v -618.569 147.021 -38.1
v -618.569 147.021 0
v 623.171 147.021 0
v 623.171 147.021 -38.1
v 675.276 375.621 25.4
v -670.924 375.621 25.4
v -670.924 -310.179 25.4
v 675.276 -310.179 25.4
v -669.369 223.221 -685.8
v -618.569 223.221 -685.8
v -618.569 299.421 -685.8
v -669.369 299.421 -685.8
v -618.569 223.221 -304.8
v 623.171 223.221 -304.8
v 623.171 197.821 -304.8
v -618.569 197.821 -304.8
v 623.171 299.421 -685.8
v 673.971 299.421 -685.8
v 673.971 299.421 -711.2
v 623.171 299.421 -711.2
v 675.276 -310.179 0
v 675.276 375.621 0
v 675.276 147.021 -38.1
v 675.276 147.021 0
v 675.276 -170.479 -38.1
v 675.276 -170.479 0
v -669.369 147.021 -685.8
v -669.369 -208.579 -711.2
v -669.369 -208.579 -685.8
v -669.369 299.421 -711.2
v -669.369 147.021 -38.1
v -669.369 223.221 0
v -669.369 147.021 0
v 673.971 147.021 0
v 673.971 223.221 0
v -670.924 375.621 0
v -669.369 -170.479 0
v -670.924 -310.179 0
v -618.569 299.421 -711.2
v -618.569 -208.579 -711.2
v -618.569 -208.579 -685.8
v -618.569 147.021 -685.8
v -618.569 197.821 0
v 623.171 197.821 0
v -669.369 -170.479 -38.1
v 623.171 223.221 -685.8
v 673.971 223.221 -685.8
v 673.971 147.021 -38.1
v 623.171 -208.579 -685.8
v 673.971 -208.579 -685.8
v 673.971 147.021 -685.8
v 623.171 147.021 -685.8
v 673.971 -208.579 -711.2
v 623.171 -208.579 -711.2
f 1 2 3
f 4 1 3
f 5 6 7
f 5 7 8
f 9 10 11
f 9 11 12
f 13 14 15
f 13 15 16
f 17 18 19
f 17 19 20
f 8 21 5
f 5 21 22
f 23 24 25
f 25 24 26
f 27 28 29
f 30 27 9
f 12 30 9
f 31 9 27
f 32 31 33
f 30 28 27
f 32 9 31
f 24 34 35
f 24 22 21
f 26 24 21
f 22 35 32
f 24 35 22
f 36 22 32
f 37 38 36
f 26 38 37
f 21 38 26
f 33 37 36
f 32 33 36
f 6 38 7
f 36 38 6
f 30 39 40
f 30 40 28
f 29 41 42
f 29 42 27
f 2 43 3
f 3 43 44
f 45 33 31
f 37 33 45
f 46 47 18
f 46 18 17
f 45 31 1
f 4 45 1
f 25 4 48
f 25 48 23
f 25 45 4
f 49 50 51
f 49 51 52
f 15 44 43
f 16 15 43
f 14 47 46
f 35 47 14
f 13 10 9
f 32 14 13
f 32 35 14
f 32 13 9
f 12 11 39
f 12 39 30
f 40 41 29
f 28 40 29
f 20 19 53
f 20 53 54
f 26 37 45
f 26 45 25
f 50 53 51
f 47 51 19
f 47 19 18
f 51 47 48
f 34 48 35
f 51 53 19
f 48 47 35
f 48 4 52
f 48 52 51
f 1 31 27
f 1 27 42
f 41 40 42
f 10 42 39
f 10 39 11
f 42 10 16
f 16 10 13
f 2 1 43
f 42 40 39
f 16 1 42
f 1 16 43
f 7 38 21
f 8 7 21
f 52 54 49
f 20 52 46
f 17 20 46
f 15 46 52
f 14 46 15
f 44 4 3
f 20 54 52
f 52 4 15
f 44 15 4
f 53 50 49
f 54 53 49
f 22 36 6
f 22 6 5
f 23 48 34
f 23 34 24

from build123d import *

# Parameters (mm, degrees)
F0_W          = 1346.2
F0_H          = 685.8
F1_DEPTH      = 25.4
F2_W          = 50.8
F2_H          = 76.2
F3_DEPTH      = 685.8
F4_W          = 1344.644603
F4_H          = 317.5
F5_DEPTH      = 38.1
F6_W          = 50.8
F6_H          = 25.4
F8_DEPTH      = 76.2
F8_DEPTH_BACK = 431.8
F7_W          = 50.8
F7_H          = 25.4
F9_DEPTH      = 76.2
F9_DEPTH_BACK = 431.8
F10_W         = 1244.6
F10_H         = 304.8
F11_DEPTH     = 25.4


with BuildPart() as f1:
    # F0 (on Top) → F1 (new body)
    with BuildSketch(Plane.XY):
        with Locations((2.175501, 32.721092)):
            Rectangle(F0_W, F0_H)
    extrude(amount=F1_DEPTH)



with BuildPart() as f3:
    # F2 (on Top) → F3 (new body)
    with BuildSketch(Plane.XY):
        with Locations((-643.969102, 185.121092)):
            Rectangle(F2_W, F2_H)
        with Locations((648.571236, 185.121092)):
            Rectangle(F2_W, F2_H)
    extrude(amount=-F3_DEPTH)


with BuildPart() as f1_1:
    add(f1.part)

    add(f3.part)  # F5 merges F3
    # F4 (on face) → F5 (join)
    with BuildSketch(Plane(origin=(0, 0, 0), x_dir=(1, 0, 0), z_dir=(0, 0, -1))):
        with Locations((2.953199, 11.728908)):
            Rectangle(F4_W, F4_H)
    extrude(amount=F5_DEPTH)

    # F6 (on face) → F8 (join, two sides)
    with BuildSketch(Plane(origin=(0, 223.221092, 0), x_dir=(-1, 0, 0), z_dir=(0, 1, 0))) as f8_sk:
        with Locations((-648.571236, -698.5)):
            Rectangle(F6_W, F6_H)
    extrude(amount=F8_DEPTH)
    extrude(f8_sk.sketch, amount=-F8_DEPTH_BACK)

    # F7 (on face) → F9 (join, two sides)
    with BuildSketch(Plane(origin=(0, 223.221092, 0), x_dir=(-1, 0, 0), z_dir=(0, 1, 0))) as f9_sk:
        with Locations((643.969102, -698.5)):
            Rectangle(F7_W, F7_H)
    extrude(amount=F9_DEPTH)
    extrude(f9_sk.sketch, amount=-F9_DEPTH_BACK)

    # F10 (on face) → F11 (join)
    with BuildSketch(Plane(origin=(0, 223.221092, 0), x_dir=(-1, 0, 0), z_dir=(0, 1, 0))):
        with Locations((-0.871236, -152.4)):
            Rectangle(F10_W, F10_H)
    extrude(amount=-F11_DEPTH)


solid = f1_1.part
